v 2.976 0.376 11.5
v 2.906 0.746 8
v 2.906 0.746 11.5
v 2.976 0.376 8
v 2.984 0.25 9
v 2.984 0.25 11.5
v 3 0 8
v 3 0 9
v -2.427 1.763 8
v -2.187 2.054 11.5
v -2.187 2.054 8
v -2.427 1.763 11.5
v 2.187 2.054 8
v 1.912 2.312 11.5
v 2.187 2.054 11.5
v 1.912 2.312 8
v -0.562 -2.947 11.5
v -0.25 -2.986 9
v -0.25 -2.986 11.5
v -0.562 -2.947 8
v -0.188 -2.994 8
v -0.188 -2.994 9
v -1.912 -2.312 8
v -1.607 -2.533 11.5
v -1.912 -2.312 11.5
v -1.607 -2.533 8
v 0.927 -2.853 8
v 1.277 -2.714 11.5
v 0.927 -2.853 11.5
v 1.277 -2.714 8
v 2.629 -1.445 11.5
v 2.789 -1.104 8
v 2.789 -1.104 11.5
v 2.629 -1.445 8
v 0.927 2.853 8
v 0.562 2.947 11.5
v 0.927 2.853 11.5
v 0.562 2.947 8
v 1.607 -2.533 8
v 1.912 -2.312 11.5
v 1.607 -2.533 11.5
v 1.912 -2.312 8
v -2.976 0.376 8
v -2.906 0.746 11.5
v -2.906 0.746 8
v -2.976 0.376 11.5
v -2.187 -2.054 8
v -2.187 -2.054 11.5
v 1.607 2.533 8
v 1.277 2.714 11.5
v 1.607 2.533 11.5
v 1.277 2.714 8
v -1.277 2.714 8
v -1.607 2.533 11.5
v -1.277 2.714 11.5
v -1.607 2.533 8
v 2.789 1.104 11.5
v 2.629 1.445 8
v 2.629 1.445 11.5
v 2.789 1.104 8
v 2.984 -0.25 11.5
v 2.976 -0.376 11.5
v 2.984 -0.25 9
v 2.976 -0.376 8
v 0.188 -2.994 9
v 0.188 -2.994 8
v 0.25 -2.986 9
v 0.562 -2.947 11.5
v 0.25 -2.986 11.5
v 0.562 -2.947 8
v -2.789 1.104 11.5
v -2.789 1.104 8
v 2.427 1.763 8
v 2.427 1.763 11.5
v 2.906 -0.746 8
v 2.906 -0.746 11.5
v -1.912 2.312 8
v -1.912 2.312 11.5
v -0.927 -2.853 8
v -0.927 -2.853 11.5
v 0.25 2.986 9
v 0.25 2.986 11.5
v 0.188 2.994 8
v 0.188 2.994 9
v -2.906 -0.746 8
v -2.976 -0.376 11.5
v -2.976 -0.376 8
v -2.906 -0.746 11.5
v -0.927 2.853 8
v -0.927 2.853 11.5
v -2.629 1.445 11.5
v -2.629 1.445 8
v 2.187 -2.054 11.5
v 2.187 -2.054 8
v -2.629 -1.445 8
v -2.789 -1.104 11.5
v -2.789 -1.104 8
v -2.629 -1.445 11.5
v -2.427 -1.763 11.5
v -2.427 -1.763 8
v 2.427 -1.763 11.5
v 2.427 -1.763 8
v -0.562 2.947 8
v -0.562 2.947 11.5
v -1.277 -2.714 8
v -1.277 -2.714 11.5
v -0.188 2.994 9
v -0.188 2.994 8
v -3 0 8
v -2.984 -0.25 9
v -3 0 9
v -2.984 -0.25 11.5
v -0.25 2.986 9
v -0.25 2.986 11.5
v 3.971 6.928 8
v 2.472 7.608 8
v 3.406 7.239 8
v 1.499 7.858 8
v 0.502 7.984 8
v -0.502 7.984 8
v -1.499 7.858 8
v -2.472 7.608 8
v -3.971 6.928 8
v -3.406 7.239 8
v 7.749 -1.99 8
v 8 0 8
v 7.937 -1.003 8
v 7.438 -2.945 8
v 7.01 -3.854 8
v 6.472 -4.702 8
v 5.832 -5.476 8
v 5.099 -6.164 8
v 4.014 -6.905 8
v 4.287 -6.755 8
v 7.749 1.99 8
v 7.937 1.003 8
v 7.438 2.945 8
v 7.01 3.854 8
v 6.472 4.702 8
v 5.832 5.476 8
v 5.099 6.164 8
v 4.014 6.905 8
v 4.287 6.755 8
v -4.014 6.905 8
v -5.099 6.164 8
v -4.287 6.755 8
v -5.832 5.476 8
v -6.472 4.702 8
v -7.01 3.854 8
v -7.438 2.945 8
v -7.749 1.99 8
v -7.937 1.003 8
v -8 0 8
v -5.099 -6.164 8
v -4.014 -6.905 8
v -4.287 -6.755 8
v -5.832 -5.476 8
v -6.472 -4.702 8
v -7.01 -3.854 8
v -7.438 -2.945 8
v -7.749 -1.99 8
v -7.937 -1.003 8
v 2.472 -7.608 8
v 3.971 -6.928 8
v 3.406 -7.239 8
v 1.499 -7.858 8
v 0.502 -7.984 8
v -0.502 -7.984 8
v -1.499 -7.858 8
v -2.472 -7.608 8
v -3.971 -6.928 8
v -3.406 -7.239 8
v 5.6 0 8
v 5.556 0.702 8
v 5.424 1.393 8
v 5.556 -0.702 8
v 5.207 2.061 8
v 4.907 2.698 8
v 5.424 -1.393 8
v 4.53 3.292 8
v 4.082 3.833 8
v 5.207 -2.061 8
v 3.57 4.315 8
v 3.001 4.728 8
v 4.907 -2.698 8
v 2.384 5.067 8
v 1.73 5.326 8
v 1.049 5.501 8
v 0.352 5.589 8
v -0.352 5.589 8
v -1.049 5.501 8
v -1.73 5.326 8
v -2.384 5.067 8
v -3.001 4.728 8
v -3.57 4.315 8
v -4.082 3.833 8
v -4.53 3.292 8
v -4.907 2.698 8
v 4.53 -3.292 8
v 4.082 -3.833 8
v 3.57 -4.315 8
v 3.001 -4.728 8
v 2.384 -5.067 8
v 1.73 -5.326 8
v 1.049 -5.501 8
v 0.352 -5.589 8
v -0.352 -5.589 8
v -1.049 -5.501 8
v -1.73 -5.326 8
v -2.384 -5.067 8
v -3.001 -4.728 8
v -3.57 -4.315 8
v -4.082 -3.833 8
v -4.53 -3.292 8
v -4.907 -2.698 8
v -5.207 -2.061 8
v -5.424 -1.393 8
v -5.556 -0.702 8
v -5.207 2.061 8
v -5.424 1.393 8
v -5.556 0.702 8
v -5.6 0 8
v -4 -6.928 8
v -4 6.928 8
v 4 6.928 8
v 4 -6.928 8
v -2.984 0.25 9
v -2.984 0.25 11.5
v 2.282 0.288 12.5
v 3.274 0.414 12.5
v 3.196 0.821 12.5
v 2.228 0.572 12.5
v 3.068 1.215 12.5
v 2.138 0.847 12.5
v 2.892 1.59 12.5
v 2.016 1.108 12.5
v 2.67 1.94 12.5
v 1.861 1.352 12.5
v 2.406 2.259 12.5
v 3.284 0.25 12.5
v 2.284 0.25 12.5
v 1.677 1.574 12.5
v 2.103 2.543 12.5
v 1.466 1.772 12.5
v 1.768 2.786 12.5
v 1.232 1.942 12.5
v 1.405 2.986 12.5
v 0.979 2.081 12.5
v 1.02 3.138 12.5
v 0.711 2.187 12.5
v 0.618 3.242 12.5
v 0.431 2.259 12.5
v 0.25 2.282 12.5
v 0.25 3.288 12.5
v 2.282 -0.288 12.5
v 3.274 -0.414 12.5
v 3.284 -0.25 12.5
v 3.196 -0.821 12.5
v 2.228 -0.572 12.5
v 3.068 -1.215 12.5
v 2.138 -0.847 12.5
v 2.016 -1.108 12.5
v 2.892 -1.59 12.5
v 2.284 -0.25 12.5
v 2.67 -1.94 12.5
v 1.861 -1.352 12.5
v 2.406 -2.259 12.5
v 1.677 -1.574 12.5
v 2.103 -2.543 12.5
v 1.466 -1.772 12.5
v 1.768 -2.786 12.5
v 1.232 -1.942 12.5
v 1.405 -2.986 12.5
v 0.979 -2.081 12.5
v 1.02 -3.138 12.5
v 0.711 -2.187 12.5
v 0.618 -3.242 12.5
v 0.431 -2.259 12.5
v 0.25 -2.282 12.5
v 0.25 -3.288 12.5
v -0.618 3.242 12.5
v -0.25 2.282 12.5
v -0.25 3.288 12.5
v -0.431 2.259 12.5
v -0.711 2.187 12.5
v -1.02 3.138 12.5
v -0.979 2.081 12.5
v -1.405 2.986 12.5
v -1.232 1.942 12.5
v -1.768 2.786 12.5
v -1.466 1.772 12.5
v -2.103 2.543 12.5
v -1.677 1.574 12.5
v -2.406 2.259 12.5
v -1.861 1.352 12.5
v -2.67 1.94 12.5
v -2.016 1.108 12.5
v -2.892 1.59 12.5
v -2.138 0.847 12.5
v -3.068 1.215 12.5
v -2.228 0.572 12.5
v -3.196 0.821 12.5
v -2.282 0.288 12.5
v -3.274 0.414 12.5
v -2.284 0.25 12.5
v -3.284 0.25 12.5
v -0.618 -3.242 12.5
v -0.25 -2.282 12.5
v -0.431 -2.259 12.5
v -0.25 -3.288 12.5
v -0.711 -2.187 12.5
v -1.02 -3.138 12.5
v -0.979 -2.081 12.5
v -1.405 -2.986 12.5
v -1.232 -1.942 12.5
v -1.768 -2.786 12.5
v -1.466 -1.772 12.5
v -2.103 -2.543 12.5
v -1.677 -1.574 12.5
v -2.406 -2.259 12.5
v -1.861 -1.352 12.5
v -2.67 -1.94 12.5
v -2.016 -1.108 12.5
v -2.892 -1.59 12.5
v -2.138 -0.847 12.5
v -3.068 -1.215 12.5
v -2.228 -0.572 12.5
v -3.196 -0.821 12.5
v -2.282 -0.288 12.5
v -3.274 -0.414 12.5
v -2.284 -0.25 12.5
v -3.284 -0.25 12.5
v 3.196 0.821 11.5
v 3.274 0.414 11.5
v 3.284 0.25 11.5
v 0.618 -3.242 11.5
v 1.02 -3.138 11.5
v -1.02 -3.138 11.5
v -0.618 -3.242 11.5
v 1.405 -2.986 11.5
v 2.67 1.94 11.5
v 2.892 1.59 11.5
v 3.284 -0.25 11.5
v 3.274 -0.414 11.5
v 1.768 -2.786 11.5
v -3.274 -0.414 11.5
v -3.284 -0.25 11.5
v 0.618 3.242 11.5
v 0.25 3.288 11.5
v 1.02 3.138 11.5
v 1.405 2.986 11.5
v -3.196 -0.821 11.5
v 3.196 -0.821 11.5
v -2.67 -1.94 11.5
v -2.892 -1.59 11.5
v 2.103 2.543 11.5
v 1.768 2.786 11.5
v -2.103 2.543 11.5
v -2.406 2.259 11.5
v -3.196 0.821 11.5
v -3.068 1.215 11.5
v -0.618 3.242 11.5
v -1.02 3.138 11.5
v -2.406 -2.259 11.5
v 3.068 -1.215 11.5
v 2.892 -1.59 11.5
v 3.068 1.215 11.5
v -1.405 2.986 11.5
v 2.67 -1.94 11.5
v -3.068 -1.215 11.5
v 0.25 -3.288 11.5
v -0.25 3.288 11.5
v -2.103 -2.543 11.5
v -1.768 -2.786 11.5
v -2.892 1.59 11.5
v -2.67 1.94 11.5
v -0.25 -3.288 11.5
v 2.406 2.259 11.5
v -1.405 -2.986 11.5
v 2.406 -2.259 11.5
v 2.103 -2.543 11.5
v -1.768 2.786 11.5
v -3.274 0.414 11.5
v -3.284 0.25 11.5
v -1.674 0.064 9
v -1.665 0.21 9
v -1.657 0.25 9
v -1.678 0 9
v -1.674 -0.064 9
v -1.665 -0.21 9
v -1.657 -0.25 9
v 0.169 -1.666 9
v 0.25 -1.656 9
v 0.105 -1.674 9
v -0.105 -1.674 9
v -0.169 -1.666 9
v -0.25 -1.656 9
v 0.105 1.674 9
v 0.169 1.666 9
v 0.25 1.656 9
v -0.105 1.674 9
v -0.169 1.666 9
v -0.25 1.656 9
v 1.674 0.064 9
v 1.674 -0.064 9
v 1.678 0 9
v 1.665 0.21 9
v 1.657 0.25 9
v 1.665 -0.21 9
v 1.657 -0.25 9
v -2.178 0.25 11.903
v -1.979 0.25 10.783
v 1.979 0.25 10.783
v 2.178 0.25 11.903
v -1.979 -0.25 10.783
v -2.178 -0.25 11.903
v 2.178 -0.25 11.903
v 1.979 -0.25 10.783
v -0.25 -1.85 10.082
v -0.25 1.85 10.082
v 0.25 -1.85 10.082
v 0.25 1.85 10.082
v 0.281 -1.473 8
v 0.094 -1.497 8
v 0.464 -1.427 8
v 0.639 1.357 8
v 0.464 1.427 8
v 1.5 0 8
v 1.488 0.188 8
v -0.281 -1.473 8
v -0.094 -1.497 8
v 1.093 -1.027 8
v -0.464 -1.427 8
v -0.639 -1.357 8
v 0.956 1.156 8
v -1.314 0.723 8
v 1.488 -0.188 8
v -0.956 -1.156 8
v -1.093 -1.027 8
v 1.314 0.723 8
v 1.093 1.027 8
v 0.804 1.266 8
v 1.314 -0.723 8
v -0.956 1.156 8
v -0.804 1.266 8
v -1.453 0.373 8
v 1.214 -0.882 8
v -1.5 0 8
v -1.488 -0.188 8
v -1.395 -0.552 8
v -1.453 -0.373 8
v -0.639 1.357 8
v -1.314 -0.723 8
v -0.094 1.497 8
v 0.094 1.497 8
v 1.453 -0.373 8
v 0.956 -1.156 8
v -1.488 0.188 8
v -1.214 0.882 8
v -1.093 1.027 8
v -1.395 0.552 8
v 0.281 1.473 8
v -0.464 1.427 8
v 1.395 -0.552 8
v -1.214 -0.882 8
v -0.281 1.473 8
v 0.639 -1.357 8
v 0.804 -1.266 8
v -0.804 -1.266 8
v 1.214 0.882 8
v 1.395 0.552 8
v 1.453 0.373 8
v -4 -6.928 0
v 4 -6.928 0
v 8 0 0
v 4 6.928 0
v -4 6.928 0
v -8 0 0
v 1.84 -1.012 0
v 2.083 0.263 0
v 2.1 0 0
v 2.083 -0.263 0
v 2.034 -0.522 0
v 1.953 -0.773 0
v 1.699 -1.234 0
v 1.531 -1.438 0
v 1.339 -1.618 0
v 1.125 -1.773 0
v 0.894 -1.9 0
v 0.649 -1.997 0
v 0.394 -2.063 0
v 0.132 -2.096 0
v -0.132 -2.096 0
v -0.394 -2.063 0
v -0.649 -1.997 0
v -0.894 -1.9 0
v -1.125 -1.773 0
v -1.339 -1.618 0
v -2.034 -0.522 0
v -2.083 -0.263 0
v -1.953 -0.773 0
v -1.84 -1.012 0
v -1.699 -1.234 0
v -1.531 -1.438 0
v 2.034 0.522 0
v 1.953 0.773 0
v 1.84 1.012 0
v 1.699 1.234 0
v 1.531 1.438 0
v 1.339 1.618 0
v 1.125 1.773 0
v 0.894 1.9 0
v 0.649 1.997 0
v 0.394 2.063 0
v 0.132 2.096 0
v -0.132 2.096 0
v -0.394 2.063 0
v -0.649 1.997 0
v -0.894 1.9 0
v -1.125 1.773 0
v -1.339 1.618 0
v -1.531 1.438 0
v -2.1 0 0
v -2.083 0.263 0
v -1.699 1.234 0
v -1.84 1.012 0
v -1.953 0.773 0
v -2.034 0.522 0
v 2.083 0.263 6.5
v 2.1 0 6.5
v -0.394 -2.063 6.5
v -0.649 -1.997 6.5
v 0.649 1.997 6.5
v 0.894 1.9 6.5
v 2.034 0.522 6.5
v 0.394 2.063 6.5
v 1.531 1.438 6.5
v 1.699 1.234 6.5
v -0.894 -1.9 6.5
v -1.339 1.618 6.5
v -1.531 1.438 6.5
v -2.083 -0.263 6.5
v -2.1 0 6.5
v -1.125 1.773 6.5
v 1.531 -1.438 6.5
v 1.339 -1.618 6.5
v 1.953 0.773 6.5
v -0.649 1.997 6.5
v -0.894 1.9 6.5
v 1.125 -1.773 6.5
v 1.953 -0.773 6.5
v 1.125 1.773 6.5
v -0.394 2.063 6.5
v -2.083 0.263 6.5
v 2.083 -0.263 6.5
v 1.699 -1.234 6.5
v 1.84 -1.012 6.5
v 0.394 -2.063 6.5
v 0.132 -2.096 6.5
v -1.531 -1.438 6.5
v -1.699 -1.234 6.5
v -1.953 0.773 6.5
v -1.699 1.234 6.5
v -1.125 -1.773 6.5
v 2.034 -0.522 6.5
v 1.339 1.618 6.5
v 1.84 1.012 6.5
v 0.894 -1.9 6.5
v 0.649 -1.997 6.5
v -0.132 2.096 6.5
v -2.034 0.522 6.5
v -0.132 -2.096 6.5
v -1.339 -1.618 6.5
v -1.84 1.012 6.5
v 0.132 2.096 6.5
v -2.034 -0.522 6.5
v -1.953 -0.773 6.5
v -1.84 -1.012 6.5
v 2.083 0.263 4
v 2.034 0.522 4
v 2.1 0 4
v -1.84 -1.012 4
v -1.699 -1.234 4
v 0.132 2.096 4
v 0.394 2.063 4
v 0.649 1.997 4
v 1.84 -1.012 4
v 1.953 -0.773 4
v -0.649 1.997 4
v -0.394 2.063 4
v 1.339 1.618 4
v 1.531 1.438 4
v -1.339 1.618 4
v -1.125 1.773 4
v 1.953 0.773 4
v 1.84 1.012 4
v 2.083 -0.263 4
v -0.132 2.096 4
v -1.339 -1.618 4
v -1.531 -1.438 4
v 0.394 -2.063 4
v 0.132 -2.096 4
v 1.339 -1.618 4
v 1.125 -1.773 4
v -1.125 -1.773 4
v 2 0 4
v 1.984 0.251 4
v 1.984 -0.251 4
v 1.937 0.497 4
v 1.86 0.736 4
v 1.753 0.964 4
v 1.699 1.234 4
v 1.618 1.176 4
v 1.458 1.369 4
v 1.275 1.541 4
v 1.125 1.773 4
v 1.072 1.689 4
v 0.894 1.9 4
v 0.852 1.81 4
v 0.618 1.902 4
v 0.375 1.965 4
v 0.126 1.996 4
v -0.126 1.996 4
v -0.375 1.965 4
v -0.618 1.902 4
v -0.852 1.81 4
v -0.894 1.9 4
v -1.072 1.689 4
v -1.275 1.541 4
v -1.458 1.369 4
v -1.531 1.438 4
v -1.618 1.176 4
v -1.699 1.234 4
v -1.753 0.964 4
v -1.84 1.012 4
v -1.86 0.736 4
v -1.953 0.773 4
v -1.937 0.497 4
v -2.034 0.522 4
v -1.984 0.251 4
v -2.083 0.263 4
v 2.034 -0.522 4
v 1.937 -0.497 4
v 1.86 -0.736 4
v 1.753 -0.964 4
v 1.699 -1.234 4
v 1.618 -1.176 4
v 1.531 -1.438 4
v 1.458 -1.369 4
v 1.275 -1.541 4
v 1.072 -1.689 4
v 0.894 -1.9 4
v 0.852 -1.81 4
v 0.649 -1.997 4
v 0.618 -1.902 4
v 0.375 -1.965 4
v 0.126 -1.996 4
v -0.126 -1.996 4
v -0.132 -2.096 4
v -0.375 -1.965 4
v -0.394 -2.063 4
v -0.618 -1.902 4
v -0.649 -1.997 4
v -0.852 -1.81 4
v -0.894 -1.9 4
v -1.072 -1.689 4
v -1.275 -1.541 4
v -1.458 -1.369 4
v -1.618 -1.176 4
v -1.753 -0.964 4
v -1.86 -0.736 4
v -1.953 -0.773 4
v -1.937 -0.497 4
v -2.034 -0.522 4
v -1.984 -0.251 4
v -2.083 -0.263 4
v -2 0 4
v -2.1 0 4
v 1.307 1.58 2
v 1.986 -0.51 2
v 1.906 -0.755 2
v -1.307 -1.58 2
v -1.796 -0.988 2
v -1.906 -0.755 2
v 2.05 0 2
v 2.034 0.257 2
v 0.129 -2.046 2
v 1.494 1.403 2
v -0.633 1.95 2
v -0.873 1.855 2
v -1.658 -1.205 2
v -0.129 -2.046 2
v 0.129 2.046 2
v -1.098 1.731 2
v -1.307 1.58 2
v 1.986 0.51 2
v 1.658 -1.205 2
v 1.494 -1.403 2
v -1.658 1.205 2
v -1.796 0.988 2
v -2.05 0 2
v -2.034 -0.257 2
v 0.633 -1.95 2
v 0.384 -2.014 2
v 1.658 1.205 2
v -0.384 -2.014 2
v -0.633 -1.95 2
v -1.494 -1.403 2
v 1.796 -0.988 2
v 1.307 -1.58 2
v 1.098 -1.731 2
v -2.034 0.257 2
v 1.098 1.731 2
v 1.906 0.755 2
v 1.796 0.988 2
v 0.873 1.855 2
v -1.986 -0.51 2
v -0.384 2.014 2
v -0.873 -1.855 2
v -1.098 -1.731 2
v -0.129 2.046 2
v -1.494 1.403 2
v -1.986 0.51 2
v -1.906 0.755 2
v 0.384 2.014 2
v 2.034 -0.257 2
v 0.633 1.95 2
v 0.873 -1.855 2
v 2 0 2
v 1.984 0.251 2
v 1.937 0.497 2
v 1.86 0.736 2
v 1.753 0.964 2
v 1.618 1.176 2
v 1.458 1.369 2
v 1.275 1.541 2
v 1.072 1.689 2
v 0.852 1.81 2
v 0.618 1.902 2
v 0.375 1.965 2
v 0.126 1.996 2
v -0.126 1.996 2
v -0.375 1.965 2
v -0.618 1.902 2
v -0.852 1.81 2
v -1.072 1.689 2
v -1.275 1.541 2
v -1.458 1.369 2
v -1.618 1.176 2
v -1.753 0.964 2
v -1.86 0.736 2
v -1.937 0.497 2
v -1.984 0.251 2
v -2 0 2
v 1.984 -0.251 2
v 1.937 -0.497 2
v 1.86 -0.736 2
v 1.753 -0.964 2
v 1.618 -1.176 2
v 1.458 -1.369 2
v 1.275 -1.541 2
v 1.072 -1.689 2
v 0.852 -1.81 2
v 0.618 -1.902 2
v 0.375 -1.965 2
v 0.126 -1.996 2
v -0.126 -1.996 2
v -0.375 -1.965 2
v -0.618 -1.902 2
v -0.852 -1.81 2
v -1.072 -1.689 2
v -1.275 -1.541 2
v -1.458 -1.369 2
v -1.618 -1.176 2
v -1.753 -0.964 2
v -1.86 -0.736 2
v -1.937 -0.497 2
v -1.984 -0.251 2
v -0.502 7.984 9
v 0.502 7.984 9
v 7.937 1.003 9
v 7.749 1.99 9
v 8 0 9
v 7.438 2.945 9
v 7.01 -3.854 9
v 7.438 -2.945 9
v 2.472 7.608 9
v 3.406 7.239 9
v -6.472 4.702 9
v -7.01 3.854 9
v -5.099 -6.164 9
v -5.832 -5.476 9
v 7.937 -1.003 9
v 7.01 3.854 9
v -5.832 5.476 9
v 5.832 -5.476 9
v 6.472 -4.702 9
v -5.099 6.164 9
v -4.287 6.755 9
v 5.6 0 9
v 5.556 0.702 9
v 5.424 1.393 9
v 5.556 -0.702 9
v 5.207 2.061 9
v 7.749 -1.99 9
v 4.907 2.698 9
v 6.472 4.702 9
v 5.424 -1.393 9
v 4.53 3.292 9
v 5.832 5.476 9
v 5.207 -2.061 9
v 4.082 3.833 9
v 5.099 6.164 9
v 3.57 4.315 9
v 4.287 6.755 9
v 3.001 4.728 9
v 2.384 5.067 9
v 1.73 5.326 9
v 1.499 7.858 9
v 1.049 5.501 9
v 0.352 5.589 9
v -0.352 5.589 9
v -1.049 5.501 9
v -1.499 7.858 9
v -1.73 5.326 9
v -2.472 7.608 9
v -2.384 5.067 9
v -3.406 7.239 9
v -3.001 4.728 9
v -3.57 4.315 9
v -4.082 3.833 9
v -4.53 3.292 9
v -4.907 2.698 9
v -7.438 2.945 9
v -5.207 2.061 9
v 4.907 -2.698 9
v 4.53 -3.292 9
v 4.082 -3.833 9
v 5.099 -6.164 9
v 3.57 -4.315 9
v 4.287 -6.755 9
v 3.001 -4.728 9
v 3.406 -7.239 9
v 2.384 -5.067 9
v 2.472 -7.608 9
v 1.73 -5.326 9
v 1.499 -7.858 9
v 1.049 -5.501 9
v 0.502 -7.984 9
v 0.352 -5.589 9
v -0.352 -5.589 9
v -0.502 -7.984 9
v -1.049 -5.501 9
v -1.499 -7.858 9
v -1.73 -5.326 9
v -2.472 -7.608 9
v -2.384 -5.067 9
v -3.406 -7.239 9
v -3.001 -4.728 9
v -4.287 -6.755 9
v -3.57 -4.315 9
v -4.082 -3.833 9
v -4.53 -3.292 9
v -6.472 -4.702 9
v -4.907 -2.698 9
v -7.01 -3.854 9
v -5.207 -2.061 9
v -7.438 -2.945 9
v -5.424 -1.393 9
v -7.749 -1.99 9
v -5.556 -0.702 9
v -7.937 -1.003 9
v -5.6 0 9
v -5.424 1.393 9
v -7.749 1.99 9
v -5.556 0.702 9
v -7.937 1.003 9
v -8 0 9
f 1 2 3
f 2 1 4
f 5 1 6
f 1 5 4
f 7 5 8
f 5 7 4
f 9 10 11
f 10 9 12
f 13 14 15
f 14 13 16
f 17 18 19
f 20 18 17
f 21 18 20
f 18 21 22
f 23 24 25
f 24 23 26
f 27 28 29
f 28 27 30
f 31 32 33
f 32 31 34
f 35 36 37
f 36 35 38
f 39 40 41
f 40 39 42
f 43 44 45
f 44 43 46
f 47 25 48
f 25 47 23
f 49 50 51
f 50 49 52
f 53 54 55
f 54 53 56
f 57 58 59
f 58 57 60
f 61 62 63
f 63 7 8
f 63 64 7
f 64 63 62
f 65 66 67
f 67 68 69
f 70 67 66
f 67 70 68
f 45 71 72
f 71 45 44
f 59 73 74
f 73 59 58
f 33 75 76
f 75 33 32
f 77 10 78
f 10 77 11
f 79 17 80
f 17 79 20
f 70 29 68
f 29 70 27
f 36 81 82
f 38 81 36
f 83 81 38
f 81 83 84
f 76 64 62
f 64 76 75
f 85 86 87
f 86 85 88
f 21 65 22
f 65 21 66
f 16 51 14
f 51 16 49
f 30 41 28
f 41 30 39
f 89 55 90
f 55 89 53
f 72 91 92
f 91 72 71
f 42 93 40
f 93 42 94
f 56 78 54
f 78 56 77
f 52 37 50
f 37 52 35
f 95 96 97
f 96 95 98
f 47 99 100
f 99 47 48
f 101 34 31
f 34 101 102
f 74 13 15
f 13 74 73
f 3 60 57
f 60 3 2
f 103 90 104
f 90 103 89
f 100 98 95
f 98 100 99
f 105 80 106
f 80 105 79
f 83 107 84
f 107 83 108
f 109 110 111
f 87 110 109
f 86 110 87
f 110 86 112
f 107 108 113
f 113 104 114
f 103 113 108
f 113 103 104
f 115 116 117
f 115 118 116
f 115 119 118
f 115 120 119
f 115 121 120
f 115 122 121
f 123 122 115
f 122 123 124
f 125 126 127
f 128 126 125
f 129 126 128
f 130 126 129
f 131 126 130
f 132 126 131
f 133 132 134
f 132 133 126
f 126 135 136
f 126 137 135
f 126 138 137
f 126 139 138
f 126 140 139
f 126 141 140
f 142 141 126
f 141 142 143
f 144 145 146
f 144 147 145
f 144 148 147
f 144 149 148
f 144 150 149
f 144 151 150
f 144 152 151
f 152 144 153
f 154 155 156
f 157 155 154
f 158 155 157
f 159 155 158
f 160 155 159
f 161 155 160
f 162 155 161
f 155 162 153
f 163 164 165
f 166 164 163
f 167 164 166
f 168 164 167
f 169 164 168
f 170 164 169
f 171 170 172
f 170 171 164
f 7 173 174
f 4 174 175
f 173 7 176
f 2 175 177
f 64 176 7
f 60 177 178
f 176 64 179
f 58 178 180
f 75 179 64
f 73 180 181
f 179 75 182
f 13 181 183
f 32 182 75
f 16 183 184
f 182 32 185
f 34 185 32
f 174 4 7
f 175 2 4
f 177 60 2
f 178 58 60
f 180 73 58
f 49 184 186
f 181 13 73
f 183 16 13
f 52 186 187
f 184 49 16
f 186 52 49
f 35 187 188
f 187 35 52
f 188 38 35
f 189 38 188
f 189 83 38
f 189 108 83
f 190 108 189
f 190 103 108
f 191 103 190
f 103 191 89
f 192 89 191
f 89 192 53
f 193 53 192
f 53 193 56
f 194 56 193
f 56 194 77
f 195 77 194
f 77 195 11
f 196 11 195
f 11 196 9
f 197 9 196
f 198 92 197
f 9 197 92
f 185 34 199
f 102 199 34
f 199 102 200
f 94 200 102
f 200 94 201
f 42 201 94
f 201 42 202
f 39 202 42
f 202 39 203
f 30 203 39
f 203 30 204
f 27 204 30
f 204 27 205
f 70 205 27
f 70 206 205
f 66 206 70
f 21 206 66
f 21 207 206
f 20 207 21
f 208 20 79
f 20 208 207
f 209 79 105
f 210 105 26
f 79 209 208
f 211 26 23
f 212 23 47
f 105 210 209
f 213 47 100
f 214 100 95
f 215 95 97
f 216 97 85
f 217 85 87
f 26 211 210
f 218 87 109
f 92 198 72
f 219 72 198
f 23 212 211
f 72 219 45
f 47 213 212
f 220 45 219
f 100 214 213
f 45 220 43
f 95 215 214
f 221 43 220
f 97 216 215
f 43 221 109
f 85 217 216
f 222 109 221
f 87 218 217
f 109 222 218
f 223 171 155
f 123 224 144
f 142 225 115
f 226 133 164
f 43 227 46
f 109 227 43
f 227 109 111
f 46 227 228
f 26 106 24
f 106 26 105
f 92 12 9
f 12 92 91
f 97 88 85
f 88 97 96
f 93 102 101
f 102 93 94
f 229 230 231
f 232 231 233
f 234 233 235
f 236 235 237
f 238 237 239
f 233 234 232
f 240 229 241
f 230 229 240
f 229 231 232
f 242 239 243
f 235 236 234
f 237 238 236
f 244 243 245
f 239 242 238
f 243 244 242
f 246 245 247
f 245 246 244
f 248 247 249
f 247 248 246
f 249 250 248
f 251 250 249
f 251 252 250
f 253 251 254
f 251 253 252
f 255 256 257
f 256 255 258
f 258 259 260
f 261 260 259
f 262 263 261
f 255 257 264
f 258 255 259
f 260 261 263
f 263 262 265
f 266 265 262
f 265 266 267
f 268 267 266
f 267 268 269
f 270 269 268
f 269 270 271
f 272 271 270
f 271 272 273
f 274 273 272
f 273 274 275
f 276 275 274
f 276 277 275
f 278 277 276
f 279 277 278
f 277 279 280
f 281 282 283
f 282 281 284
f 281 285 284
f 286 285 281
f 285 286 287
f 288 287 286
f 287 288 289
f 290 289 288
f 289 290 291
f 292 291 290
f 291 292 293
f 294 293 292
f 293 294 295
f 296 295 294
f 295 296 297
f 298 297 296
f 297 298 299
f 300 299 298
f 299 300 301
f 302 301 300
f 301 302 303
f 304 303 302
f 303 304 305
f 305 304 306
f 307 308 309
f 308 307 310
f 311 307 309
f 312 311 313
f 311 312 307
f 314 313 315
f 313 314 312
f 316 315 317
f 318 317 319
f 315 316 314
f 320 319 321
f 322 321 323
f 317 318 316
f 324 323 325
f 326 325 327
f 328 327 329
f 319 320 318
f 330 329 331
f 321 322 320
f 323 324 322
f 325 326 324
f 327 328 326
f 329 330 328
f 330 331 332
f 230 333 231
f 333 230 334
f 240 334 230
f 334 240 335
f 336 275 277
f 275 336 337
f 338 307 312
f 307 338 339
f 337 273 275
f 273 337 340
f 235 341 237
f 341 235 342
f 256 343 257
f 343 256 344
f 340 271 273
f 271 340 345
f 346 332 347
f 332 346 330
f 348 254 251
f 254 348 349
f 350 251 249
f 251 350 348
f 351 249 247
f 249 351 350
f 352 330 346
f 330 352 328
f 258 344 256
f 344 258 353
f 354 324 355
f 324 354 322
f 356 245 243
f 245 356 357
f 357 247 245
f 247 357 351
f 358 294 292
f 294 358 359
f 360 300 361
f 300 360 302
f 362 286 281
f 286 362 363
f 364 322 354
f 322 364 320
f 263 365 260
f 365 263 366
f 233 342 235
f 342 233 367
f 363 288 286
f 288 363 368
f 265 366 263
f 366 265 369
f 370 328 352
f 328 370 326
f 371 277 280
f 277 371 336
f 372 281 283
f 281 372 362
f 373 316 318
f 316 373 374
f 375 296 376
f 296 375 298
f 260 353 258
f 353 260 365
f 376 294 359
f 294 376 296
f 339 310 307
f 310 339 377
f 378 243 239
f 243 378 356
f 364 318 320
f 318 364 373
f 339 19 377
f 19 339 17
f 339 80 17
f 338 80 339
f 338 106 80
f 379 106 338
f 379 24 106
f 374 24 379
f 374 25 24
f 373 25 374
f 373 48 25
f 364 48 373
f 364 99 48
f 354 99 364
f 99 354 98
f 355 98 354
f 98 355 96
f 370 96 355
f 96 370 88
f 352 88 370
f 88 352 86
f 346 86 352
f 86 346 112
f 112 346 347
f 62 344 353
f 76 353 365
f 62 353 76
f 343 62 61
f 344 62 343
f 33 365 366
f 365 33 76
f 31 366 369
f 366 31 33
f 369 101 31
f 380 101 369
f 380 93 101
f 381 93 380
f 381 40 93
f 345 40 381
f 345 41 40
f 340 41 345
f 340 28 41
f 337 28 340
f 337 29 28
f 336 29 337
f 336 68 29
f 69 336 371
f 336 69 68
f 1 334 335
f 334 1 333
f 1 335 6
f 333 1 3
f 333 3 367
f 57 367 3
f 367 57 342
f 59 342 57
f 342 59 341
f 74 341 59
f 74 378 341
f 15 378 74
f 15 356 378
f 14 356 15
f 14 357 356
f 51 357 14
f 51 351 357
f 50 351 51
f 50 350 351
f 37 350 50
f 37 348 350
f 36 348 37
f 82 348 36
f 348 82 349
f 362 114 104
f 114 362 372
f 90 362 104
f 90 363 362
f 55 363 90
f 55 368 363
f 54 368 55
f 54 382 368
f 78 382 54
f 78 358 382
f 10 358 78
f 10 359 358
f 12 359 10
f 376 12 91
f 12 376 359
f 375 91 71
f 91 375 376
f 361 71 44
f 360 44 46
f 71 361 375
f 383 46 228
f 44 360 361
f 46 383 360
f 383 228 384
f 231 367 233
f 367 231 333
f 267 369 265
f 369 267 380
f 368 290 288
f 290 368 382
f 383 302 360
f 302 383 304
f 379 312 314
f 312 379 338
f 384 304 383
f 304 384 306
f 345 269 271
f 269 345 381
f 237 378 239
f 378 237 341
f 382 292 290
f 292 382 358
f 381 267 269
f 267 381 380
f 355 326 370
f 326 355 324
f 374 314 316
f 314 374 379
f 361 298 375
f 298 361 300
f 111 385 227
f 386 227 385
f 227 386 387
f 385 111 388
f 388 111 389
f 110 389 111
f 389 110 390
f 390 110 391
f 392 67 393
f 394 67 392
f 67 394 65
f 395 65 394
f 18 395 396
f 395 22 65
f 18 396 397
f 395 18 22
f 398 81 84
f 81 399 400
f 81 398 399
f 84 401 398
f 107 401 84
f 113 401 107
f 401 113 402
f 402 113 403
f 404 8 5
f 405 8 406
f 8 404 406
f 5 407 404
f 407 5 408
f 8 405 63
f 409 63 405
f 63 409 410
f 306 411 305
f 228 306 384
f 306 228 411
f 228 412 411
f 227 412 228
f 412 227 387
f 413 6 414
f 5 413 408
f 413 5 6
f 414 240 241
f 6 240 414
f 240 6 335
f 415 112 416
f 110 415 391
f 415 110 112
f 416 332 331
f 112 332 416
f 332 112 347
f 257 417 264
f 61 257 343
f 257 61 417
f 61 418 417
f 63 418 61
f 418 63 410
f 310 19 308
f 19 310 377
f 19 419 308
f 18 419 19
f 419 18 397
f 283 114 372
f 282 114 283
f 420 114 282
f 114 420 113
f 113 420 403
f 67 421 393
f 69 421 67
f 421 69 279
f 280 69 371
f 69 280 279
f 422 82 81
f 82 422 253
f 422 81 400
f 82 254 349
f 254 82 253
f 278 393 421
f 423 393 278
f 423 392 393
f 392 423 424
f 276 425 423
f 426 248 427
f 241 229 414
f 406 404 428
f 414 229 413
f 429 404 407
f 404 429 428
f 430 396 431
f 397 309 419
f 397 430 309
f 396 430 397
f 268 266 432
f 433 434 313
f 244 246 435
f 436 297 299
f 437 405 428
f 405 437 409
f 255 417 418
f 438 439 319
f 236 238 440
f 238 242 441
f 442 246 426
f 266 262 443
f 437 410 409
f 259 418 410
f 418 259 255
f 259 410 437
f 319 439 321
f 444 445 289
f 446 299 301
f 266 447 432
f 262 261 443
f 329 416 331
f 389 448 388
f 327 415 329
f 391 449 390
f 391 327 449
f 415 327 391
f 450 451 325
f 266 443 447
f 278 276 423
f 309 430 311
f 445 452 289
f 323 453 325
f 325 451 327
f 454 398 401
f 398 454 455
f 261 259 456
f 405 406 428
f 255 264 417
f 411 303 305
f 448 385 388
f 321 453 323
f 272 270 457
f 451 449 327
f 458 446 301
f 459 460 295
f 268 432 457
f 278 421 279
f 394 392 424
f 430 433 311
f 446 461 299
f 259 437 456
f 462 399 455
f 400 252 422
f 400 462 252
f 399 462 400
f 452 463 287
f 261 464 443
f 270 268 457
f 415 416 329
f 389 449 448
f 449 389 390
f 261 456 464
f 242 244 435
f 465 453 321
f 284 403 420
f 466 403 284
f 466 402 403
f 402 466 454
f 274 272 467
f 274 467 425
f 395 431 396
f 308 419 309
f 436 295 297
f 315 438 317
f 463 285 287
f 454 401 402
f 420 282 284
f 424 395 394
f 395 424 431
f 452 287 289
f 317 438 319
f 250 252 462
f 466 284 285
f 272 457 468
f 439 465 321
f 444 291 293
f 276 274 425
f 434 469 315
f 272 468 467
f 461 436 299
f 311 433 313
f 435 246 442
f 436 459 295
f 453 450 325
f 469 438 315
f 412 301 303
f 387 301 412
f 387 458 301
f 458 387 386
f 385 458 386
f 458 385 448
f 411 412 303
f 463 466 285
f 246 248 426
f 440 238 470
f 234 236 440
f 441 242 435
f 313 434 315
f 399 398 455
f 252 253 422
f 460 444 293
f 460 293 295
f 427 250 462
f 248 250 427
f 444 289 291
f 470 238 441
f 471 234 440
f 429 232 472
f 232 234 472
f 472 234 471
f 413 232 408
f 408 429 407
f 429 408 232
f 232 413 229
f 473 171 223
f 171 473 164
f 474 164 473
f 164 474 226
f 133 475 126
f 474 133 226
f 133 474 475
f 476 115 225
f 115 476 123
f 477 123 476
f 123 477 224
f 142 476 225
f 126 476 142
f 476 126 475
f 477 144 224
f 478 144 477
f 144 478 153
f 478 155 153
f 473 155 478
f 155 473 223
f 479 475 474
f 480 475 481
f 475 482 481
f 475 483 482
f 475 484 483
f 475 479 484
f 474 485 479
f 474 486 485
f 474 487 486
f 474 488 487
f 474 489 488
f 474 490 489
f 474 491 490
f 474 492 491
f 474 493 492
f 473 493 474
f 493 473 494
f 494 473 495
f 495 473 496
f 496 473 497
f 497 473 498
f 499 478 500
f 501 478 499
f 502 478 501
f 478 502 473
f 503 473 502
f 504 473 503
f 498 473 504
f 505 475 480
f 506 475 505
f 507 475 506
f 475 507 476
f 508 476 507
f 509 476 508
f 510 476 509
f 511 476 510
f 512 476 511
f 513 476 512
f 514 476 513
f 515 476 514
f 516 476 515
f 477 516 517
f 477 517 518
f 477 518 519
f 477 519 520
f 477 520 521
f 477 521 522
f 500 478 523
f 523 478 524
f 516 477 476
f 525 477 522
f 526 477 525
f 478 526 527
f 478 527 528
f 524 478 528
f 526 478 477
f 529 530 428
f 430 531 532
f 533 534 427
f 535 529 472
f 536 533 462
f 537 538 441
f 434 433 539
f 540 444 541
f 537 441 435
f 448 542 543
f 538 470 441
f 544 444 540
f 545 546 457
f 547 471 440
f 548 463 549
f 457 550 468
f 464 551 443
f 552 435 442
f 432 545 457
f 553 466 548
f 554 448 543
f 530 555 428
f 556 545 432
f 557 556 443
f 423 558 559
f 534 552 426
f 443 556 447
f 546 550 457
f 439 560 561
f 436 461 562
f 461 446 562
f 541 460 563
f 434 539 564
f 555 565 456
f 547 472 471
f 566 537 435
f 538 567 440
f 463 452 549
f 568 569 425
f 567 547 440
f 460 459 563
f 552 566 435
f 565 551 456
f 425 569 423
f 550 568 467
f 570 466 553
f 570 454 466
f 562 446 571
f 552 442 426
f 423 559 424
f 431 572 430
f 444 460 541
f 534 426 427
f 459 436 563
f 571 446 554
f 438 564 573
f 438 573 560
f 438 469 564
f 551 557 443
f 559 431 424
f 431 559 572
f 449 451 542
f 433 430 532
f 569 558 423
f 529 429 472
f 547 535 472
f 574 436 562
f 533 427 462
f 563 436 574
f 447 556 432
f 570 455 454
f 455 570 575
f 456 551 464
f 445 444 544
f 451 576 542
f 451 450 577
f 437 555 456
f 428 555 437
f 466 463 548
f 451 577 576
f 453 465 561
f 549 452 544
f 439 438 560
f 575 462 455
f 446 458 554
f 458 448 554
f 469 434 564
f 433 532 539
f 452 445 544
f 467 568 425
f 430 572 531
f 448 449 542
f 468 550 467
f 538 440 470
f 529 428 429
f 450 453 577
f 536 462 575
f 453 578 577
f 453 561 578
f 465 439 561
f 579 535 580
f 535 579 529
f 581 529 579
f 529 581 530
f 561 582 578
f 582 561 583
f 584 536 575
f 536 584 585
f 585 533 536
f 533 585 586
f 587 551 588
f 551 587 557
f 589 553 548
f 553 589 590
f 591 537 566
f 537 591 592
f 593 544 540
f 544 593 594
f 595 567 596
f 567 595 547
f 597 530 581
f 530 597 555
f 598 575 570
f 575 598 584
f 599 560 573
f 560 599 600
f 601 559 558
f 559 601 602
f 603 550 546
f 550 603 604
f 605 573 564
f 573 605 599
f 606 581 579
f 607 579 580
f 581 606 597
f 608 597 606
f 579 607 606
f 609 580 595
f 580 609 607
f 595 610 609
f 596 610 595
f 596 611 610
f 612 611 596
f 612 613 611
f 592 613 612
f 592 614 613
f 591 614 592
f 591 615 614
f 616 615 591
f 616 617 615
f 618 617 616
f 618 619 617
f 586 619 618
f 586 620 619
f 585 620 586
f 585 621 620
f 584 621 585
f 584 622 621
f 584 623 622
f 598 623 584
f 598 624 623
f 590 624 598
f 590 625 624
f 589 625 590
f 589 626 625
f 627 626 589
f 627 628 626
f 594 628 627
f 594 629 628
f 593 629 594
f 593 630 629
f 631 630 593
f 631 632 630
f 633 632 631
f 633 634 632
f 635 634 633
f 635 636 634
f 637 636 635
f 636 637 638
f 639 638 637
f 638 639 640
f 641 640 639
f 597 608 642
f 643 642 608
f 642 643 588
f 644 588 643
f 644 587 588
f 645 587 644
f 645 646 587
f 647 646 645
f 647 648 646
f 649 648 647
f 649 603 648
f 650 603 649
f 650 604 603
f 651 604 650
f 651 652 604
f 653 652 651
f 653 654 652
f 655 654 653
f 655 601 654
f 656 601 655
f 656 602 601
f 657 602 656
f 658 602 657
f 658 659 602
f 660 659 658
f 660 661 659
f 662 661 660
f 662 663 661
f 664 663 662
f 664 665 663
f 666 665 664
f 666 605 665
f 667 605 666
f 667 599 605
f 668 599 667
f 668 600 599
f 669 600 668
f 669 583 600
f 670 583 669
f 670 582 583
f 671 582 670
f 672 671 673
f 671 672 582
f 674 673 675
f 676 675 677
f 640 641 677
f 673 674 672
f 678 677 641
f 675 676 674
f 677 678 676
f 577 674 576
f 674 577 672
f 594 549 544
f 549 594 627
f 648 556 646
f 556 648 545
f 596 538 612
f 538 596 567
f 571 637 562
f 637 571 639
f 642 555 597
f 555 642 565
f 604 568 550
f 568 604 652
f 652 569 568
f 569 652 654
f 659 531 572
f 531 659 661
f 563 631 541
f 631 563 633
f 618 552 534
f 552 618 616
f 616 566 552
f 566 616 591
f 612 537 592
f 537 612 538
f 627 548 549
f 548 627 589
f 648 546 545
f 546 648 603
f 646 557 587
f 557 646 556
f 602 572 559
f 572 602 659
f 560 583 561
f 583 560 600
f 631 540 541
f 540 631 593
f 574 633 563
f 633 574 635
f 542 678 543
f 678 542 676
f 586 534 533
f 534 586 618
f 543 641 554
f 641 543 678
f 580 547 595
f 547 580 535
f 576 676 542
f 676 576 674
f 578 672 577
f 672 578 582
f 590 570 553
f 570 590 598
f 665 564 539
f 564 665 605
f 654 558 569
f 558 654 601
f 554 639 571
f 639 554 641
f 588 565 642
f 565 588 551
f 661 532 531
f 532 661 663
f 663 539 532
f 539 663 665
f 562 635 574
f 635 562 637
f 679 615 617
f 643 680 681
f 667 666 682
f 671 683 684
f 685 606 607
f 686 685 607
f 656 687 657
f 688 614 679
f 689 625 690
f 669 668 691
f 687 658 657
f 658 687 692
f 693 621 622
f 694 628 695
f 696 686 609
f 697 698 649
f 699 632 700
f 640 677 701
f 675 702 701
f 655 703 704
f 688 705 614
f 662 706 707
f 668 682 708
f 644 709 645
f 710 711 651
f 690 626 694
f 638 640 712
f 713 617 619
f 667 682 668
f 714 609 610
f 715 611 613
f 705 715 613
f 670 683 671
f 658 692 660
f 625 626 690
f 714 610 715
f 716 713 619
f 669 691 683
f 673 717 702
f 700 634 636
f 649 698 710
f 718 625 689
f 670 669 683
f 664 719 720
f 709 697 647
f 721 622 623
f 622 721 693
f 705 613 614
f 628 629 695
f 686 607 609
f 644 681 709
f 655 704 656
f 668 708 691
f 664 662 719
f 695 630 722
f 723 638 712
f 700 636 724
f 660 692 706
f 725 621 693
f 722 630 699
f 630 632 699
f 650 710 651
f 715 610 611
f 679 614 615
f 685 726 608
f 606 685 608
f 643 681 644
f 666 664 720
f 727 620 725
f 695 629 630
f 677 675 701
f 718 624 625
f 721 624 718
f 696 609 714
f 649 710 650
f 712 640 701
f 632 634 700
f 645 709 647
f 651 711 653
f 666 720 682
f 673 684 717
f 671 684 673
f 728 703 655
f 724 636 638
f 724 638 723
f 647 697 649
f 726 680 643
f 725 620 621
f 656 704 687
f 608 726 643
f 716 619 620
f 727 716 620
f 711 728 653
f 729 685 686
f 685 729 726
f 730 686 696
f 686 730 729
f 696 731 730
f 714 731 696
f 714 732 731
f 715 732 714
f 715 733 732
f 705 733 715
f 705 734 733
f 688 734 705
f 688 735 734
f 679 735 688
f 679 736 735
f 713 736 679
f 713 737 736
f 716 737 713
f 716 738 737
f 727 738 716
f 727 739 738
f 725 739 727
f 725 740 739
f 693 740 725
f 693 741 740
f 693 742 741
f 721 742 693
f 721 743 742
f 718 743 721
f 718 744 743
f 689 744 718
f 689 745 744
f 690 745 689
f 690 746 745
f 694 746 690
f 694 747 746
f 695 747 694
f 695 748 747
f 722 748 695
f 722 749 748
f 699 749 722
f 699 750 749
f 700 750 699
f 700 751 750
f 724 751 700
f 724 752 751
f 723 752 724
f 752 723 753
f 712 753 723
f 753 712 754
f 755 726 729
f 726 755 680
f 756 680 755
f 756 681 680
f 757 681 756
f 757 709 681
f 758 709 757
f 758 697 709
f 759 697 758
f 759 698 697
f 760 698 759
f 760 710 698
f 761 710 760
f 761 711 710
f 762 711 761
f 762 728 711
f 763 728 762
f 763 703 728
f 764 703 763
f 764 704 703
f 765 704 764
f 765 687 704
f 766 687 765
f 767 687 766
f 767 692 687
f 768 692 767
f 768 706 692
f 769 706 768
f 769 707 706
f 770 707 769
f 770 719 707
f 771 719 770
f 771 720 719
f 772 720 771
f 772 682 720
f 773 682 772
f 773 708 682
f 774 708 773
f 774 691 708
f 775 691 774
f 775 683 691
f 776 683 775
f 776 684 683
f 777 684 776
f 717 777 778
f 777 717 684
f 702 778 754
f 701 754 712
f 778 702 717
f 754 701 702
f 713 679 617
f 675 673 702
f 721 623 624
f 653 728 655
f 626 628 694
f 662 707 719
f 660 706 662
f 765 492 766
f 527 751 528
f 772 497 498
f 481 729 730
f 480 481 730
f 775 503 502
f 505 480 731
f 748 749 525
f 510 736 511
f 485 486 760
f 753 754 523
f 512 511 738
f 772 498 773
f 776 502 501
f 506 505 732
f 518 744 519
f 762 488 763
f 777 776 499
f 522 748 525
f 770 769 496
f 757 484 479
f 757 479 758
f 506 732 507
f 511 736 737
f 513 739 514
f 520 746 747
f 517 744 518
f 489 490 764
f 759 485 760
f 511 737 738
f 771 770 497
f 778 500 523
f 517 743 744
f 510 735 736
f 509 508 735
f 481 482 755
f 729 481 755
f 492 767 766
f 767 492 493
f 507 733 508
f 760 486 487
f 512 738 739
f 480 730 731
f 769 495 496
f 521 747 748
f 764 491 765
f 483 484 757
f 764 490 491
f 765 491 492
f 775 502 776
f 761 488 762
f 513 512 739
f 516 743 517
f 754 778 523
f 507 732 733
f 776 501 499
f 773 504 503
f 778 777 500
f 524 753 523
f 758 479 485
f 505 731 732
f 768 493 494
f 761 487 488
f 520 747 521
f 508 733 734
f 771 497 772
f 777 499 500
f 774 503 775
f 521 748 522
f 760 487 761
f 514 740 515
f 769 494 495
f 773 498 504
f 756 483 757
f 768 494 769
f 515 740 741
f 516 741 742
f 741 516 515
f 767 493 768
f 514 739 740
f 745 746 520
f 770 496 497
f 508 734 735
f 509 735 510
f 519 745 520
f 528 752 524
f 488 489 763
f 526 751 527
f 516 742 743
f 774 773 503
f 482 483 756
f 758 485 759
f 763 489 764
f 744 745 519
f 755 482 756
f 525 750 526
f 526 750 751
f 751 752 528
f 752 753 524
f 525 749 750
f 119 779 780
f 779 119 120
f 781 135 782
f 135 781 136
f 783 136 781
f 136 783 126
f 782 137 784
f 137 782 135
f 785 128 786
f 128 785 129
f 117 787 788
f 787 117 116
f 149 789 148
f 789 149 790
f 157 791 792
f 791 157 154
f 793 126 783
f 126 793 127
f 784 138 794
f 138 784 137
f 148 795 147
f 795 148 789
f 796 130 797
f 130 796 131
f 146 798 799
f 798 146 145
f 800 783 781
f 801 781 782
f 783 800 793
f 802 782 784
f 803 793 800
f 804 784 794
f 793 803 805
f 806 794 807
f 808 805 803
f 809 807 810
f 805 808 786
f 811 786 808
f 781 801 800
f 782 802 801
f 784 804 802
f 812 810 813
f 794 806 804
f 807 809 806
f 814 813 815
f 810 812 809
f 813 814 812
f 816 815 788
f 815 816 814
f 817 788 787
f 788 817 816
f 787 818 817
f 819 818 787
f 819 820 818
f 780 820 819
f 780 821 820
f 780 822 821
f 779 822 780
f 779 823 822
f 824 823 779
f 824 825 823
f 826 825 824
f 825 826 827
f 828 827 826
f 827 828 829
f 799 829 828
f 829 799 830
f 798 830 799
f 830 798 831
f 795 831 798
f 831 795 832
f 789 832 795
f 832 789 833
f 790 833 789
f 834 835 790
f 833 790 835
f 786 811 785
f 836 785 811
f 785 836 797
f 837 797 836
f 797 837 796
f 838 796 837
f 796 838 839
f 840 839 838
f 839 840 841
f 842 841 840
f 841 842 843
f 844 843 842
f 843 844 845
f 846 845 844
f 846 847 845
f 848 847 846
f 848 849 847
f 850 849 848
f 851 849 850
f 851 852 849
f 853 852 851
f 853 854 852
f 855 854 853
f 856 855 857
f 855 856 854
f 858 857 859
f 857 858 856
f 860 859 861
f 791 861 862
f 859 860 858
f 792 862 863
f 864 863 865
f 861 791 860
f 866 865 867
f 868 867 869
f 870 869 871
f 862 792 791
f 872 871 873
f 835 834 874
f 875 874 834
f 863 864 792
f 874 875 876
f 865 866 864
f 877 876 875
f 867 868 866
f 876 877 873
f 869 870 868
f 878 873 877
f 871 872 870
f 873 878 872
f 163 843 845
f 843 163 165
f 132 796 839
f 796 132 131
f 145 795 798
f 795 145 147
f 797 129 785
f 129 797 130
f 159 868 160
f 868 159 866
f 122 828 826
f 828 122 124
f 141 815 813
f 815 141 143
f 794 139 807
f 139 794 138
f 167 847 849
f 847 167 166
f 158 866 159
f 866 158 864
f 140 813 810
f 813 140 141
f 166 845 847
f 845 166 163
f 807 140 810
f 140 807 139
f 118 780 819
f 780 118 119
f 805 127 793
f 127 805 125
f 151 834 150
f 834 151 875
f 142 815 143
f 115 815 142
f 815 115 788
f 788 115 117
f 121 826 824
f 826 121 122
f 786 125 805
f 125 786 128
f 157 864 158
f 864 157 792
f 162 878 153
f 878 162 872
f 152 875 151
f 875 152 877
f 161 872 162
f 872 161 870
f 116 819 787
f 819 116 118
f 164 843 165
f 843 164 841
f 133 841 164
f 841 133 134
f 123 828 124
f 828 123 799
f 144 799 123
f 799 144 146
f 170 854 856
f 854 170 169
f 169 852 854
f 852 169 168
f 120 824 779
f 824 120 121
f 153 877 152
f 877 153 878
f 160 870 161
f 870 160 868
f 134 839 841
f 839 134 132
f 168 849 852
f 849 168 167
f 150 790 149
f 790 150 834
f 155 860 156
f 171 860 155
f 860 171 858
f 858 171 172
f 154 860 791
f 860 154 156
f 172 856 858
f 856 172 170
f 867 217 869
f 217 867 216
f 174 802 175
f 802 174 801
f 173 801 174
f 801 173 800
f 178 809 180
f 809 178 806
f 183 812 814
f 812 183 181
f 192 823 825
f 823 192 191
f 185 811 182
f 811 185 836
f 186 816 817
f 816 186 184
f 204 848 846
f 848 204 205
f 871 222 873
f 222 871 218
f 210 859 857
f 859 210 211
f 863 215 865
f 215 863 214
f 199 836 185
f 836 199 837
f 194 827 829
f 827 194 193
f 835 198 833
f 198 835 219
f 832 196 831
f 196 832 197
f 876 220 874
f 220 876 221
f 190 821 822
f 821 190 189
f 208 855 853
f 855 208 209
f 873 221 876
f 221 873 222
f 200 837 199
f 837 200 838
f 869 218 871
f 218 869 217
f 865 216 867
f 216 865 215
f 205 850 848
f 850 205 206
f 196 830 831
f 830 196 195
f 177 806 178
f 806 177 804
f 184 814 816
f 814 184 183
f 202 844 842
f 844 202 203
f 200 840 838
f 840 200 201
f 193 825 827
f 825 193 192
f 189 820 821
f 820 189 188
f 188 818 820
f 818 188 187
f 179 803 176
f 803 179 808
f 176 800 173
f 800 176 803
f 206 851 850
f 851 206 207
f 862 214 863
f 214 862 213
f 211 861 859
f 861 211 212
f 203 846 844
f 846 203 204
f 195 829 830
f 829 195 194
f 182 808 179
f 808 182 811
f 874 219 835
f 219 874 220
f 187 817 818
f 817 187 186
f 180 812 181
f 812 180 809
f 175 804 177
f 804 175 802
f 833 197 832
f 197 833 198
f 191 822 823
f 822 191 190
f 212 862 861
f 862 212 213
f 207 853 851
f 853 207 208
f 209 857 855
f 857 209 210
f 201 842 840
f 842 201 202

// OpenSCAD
// file: adapter.scad
module adapter_grommet(filament_r=1.5) {

     grommet_id = 6.1;
     grommet_thick = 3.5;

     pin_length = grommet_thick;

     pin_or = grommet_id / 2;
     pin_ir = pin_or - 1.5;
     bump_or = pin_or + 0.25;

     $fn = 50;

     difference() {
	  // outer shape of pin, with bump on rim
	  union() {
	       cylinder(pin_length + 1, r=3);
	       translate([0, 0, pin_length]) {
		    cylinder(1, r=bump_or);
	       };
	  }

	  // slots for relief
	  translate([0, 0, 4]) {
	       cube([10, 0.5, 6], center=true);

	       rotate([0, 0, 90]) {
		    cube([10, 0.5, 6], center=true);
	       };
	  };

	  cylinder(pin_length + 1, filament_r, pin_or - 0.75);
     };
}


module adapter_tube(tubing_od=4.1, pinch=0.1, filament_r=1.5) {

     hole_r = tubing_od / 2;
     squeeze_r = hole_r - (pinch / 2);
     spacious_r = hole_r + (pinch / 2);

     $fn = 50;

     difference() {
	  // I like the look of a hex nut for the body of the adapter
	  cylinder(8, r=8, $fn=6);

	  // upper ceiling contracts to the grommet adapter size
	  translate([0, 0, 6.5]) {
	       cylinder(1.5, spacious_r, filament_r);
	  };

	  // main space
	  translate([0, 0, 4]) {
	       cylinder(2.5, r=spacious_r);
	  };

	  // inner flange
	  translate([0, 0, 2]) {
	       cylinder(2, hole_r, squeeze_r);
	  };

	  // bottom flange
	  cylinder(2, spacious_r, squeeze_r);
     };

     // a little ring that fits over the protrusion of the grommet
     translate([0, 0, 8]) {
	  difference() {
	       cylinder(1, r=8);
	       translate([0, 0, -1]) {
		    cylinder(3, r=5.6);
	       };
	  };
     };
}


module adapter(tubing_od=4.1) {
     union() {
	  translate([0, 0, 8]) {
	       adapter_grommet();
	  };
	  adapter_tube(tubing_od);
     };
}


adapter();


// The end.
// main file
use <adapter.scad>;

adapter(tubing_od=4.1);


// The end.
